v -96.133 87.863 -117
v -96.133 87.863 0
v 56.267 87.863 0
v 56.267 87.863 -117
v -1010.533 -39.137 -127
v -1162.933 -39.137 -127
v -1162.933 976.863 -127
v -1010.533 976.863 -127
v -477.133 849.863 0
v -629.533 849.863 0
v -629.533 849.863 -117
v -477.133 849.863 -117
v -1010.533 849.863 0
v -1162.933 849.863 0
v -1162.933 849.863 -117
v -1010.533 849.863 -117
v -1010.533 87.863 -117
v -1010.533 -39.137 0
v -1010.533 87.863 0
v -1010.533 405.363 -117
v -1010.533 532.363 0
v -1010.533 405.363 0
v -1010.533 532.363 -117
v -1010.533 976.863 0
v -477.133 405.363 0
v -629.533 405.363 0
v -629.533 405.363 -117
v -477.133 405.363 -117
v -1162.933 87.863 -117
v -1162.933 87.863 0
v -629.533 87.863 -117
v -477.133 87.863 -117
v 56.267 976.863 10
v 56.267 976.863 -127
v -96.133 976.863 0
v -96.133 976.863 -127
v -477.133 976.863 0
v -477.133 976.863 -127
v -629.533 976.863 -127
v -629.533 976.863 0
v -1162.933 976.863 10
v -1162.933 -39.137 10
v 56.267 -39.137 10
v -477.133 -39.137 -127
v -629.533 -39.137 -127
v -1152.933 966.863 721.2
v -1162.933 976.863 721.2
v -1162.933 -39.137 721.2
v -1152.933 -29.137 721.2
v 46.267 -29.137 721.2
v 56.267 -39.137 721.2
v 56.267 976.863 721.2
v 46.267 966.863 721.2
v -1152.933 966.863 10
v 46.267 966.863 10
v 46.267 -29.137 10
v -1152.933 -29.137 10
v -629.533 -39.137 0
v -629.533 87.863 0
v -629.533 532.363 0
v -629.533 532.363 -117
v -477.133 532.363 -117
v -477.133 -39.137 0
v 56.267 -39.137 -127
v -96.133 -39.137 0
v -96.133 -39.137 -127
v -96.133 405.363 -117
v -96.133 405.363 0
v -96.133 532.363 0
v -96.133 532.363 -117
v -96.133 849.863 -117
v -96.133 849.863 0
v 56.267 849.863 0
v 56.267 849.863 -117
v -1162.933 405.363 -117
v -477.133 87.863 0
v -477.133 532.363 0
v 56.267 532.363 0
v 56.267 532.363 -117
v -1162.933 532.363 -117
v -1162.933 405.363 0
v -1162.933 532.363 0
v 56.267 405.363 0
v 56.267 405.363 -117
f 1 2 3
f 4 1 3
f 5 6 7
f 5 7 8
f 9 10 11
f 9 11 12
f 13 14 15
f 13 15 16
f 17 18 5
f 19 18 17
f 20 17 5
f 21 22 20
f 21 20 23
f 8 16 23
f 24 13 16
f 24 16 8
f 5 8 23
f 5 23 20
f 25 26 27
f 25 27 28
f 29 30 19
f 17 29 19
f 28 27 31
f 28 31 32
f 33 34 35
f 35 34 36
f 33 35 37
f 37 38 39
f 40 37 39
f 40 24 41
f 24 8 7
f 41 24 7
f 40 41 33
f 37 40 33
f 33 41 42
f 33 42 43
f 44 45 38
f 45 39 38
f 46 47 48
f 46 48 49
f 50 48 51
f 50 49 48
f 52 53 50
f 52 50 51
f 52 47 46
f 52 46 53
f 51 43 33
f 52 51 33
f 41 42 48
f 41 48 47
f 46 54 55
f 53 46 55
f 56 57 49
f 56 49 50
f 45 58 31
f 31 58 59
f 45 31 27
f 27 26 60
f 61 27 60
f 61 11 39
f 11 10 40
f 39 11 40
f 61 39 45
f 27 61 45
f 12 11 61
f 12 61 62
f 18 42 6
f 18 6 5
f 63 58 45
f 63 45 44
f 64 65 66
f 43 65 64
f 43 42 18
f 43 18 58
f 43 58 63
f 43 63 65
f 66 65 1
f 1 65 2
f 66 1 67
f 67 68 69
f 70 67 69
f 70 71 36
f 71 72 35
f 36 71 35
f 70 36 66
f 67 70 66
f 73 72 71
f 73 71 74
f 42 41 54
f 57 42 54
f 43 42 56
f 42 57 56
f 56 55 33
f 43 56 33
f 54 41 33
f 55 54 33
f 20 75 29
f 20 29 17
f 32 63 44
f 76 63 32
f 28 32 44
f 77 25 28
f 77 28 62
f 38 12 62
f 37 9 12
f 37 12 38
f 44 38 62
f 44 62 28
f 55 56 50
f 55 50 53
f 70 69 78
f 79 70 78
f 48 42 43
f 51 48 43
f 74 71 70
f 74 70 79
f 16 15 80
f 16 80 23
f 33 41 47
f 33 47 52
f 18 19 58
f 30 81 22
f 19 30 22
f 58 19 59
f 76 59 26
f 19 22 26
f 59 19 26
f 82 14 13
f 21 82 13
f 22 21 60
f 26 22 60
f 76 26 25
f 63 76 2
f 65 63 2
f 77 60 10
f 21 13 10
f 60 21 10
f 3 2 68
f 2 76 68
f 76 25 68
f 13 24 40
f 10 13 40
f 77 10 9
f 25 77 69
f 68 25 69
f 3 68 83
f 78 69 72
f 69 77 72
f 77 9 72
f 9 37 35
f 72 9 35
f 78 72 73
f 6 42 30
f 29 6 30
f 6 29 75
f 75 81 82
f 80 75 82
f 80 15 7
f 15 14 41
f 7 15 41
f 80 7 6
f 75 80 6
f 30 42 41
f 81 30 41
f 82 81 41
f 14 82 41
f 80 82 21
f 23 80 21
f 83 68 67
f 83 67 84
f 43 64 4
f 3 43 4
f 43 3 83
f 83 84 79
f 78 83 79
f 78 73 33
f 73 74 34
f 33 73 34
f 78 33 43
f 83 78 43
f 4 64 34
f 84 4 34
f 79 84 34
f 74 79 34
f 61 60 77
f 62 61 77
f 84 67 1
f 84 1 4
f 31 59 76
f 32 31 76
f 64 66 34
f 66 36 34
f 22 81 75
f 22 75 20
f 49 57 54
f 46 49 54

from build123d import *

# Parameters (mm, degrees)
F0_W     = 152.4
F0_H     = 127
F0_W_2   = 381
F0_H_2   = 317.5
F1_DEPTH = 10
F2_DEPTH = 127
F3_START = -117
F3_DEPTH = 10
F4_W     = 1219.2
F4_H     = 1016
F4_W_2   = 1199.2
F4_H_2   = 996
F5_DEPTH = 711.2


with BuildPart() as f1:
    # F0 (on Top) → F1 (new body)
    with BuildSketch(Plane.XY):
        with Locations((-1086.7330067158, 913.3629122376)):
            Rectangle(F0_W, F0_H)
        with Locations((-820.0330067158, 913.3629122376)):
            Rectangle(F0_W_2, F0_H)
        with Locations((-553.3330067158, 913.3629122376)):
            Rectangle(F0_W, F0_H)
        with Locations((-286.6330067158, 913.3629122376)):
            Rectangle(F0_W_2, F0_H)
        with Locations((-19.9330067158, 913.3629122376)):
            Rectangle(F0_W, F0_H)
        with Locations((-19.9330067158, 691.1129122376)):
            Rectangle(F0_W, F0_H_2)
        with Locations((-286.6330067158, 691.1129122376)):
            Rectangle(F0_W_2, F0_H_2)
        with Locations((-553.3330067158, 691.1129122376)):
            Rectangle(F0_W, F0_H_2)
        with Locations((-820.0330067158, 691.1129122376)):
            Rectangle(F0_W_2, F0_H_2)
        with Locations((-1086.7330067158, 691.1129122376)):
            Rectangle(F0_W, F0_H_2)
        with Locations((-1086.7330067158, 24.3629122376)):
            Rectangle(F0_W, F0_H)
        with Locations((-1086.7330067158, 246.6129122376)):
            Rectangle(F0_W, F0_H_2)
        with Locations((-820.0330067158, 24.3629122376)):
            Rectangle(F0_W_2, F0_H)
        with Locations((-286.6330067158, 246.6129122376)):
            Rectangle(F0_W_2, F0_H_2)
        with Locations((-820.0330067158, 246.6129122376)):
            Rectangle(F0_W_2, F0_H_2)
        with Locations((-286.6330067158, 24.3629122376)):
            Rectangle(F0_W_2, F0_H)
        with Locations((-19.9330067158, 246.6129122376)):
            Rectangle(F0_W, F0_H_2)
        with Locations((-1086.7330067158, 468.8629122376)):
            Rectangle(F0_W, F0_H)
        with Locations((-820.0330067158, 468.8629122376)):
            Rectangle(F0_W_2, F0_H)
        with Locations((-553.3330067158, 468.8629122376)):
            Rectangle(F0_W, F0_H)
        with Locations((-286.6330067158, 468.8629122376)):
            Rectangle(F0_W_2, F0_H)
        with Locations((-553.3330067158, 246.6129122376)):
            Rectangle(F0_W, F0_H_2)
        with Locations((-19.9330067158, 468.8629122376)):
            Rectangle(F0_W, F0_H)
        with Locations((-553.3330067158, 24.3629122376)):
            Rectangle(F0_W, F0_H)
        with Locations((-19.9330067158, 24.3629122376)):
            Rectangle(F0_W, F0_H)
    extrude(amount=F1_DEPTH)

    # F0 (on Top) → F2 (join)
    with BuildSketch(Plane.XY):
        with Locations((-1086.7330067158, 24.3629122376)):
            Rectangle(F0_W, F0_H)
        with Locations((-553.3330067158, 24.3629122376)):
            Rectangle(F0_W, F0_H)
        with Locations((-19.9330067158, 24.3629122376)):
            Rectangle(F0_W, F0_H)
        with Locations((-19.9330067158, 468.8629122376)):
            Rectangle(F0_W, F0_H)
        with Locations((-553.3330067158, 468.8629122376)):
            Rectangle(F0_W, F0_H)
        with Locations((-1086.7330067158, 468.8629122376)):
            Rectangle(F0_W, F0_H)
        with Locations((-1086.7330067158, 913.3629122376)):
            Rectangle(F0_W, F0_H)
        with Locations((-553.3330067158, 913.3629122376)):
            Rectangle(F0_W, F0_H)
        with Locations((-19.9330067158, 913.3629122376)):
            Rectangle(F0_W, F0_H)
    extrude(amount=-F2_DEPTH)

    # F0 (on Top) → F3 (join)
    with BuildSketch(Plane.XY.offset(F3_START)):
        with Locations((-1086.7330067158, 246.6129122376)):
            Rectangle(F0_W, F0_H_2)
        with Locations((-553.3330067158, 246.6129122376)):
            Rectangle(F0_W, F0_H_2)
        with Locations((-19.9330067158, 246.6129122376)):
            Rectangle(F0_W, F0_H_2)
        with Locations((-19.9330067158, 691.1129122376)):
            Rectangle(F0_W, F0_H_2)
        with Locations((-553.3330067158, 691.1129122376)):
            Rectangle(F0_W, F0_H_2)
        with Locations((-1086.7330067158, 691.1129122376)):
            Rectangle(F0_W, F0_H_2)
    extrude(amount=-F3_DEPTH)


with BuildPart() as f5:
    # F4 (on face) → F5 (new body)
    with BuildSketch(Plane.XY.offset(10)):
        with Locations((-553.3330067158, 468.8629122376)):
            Rectangle(F4_W, F4_H)
        with Locations((-553.3330067158, 468.8629122376)):
            Rectangle(F4_W_2, F4_H_2, mode=Mode.SUBTRACT)
    extrude(amount=F5_DEPTH)


solid = Compound([f1.part, f5.part])
